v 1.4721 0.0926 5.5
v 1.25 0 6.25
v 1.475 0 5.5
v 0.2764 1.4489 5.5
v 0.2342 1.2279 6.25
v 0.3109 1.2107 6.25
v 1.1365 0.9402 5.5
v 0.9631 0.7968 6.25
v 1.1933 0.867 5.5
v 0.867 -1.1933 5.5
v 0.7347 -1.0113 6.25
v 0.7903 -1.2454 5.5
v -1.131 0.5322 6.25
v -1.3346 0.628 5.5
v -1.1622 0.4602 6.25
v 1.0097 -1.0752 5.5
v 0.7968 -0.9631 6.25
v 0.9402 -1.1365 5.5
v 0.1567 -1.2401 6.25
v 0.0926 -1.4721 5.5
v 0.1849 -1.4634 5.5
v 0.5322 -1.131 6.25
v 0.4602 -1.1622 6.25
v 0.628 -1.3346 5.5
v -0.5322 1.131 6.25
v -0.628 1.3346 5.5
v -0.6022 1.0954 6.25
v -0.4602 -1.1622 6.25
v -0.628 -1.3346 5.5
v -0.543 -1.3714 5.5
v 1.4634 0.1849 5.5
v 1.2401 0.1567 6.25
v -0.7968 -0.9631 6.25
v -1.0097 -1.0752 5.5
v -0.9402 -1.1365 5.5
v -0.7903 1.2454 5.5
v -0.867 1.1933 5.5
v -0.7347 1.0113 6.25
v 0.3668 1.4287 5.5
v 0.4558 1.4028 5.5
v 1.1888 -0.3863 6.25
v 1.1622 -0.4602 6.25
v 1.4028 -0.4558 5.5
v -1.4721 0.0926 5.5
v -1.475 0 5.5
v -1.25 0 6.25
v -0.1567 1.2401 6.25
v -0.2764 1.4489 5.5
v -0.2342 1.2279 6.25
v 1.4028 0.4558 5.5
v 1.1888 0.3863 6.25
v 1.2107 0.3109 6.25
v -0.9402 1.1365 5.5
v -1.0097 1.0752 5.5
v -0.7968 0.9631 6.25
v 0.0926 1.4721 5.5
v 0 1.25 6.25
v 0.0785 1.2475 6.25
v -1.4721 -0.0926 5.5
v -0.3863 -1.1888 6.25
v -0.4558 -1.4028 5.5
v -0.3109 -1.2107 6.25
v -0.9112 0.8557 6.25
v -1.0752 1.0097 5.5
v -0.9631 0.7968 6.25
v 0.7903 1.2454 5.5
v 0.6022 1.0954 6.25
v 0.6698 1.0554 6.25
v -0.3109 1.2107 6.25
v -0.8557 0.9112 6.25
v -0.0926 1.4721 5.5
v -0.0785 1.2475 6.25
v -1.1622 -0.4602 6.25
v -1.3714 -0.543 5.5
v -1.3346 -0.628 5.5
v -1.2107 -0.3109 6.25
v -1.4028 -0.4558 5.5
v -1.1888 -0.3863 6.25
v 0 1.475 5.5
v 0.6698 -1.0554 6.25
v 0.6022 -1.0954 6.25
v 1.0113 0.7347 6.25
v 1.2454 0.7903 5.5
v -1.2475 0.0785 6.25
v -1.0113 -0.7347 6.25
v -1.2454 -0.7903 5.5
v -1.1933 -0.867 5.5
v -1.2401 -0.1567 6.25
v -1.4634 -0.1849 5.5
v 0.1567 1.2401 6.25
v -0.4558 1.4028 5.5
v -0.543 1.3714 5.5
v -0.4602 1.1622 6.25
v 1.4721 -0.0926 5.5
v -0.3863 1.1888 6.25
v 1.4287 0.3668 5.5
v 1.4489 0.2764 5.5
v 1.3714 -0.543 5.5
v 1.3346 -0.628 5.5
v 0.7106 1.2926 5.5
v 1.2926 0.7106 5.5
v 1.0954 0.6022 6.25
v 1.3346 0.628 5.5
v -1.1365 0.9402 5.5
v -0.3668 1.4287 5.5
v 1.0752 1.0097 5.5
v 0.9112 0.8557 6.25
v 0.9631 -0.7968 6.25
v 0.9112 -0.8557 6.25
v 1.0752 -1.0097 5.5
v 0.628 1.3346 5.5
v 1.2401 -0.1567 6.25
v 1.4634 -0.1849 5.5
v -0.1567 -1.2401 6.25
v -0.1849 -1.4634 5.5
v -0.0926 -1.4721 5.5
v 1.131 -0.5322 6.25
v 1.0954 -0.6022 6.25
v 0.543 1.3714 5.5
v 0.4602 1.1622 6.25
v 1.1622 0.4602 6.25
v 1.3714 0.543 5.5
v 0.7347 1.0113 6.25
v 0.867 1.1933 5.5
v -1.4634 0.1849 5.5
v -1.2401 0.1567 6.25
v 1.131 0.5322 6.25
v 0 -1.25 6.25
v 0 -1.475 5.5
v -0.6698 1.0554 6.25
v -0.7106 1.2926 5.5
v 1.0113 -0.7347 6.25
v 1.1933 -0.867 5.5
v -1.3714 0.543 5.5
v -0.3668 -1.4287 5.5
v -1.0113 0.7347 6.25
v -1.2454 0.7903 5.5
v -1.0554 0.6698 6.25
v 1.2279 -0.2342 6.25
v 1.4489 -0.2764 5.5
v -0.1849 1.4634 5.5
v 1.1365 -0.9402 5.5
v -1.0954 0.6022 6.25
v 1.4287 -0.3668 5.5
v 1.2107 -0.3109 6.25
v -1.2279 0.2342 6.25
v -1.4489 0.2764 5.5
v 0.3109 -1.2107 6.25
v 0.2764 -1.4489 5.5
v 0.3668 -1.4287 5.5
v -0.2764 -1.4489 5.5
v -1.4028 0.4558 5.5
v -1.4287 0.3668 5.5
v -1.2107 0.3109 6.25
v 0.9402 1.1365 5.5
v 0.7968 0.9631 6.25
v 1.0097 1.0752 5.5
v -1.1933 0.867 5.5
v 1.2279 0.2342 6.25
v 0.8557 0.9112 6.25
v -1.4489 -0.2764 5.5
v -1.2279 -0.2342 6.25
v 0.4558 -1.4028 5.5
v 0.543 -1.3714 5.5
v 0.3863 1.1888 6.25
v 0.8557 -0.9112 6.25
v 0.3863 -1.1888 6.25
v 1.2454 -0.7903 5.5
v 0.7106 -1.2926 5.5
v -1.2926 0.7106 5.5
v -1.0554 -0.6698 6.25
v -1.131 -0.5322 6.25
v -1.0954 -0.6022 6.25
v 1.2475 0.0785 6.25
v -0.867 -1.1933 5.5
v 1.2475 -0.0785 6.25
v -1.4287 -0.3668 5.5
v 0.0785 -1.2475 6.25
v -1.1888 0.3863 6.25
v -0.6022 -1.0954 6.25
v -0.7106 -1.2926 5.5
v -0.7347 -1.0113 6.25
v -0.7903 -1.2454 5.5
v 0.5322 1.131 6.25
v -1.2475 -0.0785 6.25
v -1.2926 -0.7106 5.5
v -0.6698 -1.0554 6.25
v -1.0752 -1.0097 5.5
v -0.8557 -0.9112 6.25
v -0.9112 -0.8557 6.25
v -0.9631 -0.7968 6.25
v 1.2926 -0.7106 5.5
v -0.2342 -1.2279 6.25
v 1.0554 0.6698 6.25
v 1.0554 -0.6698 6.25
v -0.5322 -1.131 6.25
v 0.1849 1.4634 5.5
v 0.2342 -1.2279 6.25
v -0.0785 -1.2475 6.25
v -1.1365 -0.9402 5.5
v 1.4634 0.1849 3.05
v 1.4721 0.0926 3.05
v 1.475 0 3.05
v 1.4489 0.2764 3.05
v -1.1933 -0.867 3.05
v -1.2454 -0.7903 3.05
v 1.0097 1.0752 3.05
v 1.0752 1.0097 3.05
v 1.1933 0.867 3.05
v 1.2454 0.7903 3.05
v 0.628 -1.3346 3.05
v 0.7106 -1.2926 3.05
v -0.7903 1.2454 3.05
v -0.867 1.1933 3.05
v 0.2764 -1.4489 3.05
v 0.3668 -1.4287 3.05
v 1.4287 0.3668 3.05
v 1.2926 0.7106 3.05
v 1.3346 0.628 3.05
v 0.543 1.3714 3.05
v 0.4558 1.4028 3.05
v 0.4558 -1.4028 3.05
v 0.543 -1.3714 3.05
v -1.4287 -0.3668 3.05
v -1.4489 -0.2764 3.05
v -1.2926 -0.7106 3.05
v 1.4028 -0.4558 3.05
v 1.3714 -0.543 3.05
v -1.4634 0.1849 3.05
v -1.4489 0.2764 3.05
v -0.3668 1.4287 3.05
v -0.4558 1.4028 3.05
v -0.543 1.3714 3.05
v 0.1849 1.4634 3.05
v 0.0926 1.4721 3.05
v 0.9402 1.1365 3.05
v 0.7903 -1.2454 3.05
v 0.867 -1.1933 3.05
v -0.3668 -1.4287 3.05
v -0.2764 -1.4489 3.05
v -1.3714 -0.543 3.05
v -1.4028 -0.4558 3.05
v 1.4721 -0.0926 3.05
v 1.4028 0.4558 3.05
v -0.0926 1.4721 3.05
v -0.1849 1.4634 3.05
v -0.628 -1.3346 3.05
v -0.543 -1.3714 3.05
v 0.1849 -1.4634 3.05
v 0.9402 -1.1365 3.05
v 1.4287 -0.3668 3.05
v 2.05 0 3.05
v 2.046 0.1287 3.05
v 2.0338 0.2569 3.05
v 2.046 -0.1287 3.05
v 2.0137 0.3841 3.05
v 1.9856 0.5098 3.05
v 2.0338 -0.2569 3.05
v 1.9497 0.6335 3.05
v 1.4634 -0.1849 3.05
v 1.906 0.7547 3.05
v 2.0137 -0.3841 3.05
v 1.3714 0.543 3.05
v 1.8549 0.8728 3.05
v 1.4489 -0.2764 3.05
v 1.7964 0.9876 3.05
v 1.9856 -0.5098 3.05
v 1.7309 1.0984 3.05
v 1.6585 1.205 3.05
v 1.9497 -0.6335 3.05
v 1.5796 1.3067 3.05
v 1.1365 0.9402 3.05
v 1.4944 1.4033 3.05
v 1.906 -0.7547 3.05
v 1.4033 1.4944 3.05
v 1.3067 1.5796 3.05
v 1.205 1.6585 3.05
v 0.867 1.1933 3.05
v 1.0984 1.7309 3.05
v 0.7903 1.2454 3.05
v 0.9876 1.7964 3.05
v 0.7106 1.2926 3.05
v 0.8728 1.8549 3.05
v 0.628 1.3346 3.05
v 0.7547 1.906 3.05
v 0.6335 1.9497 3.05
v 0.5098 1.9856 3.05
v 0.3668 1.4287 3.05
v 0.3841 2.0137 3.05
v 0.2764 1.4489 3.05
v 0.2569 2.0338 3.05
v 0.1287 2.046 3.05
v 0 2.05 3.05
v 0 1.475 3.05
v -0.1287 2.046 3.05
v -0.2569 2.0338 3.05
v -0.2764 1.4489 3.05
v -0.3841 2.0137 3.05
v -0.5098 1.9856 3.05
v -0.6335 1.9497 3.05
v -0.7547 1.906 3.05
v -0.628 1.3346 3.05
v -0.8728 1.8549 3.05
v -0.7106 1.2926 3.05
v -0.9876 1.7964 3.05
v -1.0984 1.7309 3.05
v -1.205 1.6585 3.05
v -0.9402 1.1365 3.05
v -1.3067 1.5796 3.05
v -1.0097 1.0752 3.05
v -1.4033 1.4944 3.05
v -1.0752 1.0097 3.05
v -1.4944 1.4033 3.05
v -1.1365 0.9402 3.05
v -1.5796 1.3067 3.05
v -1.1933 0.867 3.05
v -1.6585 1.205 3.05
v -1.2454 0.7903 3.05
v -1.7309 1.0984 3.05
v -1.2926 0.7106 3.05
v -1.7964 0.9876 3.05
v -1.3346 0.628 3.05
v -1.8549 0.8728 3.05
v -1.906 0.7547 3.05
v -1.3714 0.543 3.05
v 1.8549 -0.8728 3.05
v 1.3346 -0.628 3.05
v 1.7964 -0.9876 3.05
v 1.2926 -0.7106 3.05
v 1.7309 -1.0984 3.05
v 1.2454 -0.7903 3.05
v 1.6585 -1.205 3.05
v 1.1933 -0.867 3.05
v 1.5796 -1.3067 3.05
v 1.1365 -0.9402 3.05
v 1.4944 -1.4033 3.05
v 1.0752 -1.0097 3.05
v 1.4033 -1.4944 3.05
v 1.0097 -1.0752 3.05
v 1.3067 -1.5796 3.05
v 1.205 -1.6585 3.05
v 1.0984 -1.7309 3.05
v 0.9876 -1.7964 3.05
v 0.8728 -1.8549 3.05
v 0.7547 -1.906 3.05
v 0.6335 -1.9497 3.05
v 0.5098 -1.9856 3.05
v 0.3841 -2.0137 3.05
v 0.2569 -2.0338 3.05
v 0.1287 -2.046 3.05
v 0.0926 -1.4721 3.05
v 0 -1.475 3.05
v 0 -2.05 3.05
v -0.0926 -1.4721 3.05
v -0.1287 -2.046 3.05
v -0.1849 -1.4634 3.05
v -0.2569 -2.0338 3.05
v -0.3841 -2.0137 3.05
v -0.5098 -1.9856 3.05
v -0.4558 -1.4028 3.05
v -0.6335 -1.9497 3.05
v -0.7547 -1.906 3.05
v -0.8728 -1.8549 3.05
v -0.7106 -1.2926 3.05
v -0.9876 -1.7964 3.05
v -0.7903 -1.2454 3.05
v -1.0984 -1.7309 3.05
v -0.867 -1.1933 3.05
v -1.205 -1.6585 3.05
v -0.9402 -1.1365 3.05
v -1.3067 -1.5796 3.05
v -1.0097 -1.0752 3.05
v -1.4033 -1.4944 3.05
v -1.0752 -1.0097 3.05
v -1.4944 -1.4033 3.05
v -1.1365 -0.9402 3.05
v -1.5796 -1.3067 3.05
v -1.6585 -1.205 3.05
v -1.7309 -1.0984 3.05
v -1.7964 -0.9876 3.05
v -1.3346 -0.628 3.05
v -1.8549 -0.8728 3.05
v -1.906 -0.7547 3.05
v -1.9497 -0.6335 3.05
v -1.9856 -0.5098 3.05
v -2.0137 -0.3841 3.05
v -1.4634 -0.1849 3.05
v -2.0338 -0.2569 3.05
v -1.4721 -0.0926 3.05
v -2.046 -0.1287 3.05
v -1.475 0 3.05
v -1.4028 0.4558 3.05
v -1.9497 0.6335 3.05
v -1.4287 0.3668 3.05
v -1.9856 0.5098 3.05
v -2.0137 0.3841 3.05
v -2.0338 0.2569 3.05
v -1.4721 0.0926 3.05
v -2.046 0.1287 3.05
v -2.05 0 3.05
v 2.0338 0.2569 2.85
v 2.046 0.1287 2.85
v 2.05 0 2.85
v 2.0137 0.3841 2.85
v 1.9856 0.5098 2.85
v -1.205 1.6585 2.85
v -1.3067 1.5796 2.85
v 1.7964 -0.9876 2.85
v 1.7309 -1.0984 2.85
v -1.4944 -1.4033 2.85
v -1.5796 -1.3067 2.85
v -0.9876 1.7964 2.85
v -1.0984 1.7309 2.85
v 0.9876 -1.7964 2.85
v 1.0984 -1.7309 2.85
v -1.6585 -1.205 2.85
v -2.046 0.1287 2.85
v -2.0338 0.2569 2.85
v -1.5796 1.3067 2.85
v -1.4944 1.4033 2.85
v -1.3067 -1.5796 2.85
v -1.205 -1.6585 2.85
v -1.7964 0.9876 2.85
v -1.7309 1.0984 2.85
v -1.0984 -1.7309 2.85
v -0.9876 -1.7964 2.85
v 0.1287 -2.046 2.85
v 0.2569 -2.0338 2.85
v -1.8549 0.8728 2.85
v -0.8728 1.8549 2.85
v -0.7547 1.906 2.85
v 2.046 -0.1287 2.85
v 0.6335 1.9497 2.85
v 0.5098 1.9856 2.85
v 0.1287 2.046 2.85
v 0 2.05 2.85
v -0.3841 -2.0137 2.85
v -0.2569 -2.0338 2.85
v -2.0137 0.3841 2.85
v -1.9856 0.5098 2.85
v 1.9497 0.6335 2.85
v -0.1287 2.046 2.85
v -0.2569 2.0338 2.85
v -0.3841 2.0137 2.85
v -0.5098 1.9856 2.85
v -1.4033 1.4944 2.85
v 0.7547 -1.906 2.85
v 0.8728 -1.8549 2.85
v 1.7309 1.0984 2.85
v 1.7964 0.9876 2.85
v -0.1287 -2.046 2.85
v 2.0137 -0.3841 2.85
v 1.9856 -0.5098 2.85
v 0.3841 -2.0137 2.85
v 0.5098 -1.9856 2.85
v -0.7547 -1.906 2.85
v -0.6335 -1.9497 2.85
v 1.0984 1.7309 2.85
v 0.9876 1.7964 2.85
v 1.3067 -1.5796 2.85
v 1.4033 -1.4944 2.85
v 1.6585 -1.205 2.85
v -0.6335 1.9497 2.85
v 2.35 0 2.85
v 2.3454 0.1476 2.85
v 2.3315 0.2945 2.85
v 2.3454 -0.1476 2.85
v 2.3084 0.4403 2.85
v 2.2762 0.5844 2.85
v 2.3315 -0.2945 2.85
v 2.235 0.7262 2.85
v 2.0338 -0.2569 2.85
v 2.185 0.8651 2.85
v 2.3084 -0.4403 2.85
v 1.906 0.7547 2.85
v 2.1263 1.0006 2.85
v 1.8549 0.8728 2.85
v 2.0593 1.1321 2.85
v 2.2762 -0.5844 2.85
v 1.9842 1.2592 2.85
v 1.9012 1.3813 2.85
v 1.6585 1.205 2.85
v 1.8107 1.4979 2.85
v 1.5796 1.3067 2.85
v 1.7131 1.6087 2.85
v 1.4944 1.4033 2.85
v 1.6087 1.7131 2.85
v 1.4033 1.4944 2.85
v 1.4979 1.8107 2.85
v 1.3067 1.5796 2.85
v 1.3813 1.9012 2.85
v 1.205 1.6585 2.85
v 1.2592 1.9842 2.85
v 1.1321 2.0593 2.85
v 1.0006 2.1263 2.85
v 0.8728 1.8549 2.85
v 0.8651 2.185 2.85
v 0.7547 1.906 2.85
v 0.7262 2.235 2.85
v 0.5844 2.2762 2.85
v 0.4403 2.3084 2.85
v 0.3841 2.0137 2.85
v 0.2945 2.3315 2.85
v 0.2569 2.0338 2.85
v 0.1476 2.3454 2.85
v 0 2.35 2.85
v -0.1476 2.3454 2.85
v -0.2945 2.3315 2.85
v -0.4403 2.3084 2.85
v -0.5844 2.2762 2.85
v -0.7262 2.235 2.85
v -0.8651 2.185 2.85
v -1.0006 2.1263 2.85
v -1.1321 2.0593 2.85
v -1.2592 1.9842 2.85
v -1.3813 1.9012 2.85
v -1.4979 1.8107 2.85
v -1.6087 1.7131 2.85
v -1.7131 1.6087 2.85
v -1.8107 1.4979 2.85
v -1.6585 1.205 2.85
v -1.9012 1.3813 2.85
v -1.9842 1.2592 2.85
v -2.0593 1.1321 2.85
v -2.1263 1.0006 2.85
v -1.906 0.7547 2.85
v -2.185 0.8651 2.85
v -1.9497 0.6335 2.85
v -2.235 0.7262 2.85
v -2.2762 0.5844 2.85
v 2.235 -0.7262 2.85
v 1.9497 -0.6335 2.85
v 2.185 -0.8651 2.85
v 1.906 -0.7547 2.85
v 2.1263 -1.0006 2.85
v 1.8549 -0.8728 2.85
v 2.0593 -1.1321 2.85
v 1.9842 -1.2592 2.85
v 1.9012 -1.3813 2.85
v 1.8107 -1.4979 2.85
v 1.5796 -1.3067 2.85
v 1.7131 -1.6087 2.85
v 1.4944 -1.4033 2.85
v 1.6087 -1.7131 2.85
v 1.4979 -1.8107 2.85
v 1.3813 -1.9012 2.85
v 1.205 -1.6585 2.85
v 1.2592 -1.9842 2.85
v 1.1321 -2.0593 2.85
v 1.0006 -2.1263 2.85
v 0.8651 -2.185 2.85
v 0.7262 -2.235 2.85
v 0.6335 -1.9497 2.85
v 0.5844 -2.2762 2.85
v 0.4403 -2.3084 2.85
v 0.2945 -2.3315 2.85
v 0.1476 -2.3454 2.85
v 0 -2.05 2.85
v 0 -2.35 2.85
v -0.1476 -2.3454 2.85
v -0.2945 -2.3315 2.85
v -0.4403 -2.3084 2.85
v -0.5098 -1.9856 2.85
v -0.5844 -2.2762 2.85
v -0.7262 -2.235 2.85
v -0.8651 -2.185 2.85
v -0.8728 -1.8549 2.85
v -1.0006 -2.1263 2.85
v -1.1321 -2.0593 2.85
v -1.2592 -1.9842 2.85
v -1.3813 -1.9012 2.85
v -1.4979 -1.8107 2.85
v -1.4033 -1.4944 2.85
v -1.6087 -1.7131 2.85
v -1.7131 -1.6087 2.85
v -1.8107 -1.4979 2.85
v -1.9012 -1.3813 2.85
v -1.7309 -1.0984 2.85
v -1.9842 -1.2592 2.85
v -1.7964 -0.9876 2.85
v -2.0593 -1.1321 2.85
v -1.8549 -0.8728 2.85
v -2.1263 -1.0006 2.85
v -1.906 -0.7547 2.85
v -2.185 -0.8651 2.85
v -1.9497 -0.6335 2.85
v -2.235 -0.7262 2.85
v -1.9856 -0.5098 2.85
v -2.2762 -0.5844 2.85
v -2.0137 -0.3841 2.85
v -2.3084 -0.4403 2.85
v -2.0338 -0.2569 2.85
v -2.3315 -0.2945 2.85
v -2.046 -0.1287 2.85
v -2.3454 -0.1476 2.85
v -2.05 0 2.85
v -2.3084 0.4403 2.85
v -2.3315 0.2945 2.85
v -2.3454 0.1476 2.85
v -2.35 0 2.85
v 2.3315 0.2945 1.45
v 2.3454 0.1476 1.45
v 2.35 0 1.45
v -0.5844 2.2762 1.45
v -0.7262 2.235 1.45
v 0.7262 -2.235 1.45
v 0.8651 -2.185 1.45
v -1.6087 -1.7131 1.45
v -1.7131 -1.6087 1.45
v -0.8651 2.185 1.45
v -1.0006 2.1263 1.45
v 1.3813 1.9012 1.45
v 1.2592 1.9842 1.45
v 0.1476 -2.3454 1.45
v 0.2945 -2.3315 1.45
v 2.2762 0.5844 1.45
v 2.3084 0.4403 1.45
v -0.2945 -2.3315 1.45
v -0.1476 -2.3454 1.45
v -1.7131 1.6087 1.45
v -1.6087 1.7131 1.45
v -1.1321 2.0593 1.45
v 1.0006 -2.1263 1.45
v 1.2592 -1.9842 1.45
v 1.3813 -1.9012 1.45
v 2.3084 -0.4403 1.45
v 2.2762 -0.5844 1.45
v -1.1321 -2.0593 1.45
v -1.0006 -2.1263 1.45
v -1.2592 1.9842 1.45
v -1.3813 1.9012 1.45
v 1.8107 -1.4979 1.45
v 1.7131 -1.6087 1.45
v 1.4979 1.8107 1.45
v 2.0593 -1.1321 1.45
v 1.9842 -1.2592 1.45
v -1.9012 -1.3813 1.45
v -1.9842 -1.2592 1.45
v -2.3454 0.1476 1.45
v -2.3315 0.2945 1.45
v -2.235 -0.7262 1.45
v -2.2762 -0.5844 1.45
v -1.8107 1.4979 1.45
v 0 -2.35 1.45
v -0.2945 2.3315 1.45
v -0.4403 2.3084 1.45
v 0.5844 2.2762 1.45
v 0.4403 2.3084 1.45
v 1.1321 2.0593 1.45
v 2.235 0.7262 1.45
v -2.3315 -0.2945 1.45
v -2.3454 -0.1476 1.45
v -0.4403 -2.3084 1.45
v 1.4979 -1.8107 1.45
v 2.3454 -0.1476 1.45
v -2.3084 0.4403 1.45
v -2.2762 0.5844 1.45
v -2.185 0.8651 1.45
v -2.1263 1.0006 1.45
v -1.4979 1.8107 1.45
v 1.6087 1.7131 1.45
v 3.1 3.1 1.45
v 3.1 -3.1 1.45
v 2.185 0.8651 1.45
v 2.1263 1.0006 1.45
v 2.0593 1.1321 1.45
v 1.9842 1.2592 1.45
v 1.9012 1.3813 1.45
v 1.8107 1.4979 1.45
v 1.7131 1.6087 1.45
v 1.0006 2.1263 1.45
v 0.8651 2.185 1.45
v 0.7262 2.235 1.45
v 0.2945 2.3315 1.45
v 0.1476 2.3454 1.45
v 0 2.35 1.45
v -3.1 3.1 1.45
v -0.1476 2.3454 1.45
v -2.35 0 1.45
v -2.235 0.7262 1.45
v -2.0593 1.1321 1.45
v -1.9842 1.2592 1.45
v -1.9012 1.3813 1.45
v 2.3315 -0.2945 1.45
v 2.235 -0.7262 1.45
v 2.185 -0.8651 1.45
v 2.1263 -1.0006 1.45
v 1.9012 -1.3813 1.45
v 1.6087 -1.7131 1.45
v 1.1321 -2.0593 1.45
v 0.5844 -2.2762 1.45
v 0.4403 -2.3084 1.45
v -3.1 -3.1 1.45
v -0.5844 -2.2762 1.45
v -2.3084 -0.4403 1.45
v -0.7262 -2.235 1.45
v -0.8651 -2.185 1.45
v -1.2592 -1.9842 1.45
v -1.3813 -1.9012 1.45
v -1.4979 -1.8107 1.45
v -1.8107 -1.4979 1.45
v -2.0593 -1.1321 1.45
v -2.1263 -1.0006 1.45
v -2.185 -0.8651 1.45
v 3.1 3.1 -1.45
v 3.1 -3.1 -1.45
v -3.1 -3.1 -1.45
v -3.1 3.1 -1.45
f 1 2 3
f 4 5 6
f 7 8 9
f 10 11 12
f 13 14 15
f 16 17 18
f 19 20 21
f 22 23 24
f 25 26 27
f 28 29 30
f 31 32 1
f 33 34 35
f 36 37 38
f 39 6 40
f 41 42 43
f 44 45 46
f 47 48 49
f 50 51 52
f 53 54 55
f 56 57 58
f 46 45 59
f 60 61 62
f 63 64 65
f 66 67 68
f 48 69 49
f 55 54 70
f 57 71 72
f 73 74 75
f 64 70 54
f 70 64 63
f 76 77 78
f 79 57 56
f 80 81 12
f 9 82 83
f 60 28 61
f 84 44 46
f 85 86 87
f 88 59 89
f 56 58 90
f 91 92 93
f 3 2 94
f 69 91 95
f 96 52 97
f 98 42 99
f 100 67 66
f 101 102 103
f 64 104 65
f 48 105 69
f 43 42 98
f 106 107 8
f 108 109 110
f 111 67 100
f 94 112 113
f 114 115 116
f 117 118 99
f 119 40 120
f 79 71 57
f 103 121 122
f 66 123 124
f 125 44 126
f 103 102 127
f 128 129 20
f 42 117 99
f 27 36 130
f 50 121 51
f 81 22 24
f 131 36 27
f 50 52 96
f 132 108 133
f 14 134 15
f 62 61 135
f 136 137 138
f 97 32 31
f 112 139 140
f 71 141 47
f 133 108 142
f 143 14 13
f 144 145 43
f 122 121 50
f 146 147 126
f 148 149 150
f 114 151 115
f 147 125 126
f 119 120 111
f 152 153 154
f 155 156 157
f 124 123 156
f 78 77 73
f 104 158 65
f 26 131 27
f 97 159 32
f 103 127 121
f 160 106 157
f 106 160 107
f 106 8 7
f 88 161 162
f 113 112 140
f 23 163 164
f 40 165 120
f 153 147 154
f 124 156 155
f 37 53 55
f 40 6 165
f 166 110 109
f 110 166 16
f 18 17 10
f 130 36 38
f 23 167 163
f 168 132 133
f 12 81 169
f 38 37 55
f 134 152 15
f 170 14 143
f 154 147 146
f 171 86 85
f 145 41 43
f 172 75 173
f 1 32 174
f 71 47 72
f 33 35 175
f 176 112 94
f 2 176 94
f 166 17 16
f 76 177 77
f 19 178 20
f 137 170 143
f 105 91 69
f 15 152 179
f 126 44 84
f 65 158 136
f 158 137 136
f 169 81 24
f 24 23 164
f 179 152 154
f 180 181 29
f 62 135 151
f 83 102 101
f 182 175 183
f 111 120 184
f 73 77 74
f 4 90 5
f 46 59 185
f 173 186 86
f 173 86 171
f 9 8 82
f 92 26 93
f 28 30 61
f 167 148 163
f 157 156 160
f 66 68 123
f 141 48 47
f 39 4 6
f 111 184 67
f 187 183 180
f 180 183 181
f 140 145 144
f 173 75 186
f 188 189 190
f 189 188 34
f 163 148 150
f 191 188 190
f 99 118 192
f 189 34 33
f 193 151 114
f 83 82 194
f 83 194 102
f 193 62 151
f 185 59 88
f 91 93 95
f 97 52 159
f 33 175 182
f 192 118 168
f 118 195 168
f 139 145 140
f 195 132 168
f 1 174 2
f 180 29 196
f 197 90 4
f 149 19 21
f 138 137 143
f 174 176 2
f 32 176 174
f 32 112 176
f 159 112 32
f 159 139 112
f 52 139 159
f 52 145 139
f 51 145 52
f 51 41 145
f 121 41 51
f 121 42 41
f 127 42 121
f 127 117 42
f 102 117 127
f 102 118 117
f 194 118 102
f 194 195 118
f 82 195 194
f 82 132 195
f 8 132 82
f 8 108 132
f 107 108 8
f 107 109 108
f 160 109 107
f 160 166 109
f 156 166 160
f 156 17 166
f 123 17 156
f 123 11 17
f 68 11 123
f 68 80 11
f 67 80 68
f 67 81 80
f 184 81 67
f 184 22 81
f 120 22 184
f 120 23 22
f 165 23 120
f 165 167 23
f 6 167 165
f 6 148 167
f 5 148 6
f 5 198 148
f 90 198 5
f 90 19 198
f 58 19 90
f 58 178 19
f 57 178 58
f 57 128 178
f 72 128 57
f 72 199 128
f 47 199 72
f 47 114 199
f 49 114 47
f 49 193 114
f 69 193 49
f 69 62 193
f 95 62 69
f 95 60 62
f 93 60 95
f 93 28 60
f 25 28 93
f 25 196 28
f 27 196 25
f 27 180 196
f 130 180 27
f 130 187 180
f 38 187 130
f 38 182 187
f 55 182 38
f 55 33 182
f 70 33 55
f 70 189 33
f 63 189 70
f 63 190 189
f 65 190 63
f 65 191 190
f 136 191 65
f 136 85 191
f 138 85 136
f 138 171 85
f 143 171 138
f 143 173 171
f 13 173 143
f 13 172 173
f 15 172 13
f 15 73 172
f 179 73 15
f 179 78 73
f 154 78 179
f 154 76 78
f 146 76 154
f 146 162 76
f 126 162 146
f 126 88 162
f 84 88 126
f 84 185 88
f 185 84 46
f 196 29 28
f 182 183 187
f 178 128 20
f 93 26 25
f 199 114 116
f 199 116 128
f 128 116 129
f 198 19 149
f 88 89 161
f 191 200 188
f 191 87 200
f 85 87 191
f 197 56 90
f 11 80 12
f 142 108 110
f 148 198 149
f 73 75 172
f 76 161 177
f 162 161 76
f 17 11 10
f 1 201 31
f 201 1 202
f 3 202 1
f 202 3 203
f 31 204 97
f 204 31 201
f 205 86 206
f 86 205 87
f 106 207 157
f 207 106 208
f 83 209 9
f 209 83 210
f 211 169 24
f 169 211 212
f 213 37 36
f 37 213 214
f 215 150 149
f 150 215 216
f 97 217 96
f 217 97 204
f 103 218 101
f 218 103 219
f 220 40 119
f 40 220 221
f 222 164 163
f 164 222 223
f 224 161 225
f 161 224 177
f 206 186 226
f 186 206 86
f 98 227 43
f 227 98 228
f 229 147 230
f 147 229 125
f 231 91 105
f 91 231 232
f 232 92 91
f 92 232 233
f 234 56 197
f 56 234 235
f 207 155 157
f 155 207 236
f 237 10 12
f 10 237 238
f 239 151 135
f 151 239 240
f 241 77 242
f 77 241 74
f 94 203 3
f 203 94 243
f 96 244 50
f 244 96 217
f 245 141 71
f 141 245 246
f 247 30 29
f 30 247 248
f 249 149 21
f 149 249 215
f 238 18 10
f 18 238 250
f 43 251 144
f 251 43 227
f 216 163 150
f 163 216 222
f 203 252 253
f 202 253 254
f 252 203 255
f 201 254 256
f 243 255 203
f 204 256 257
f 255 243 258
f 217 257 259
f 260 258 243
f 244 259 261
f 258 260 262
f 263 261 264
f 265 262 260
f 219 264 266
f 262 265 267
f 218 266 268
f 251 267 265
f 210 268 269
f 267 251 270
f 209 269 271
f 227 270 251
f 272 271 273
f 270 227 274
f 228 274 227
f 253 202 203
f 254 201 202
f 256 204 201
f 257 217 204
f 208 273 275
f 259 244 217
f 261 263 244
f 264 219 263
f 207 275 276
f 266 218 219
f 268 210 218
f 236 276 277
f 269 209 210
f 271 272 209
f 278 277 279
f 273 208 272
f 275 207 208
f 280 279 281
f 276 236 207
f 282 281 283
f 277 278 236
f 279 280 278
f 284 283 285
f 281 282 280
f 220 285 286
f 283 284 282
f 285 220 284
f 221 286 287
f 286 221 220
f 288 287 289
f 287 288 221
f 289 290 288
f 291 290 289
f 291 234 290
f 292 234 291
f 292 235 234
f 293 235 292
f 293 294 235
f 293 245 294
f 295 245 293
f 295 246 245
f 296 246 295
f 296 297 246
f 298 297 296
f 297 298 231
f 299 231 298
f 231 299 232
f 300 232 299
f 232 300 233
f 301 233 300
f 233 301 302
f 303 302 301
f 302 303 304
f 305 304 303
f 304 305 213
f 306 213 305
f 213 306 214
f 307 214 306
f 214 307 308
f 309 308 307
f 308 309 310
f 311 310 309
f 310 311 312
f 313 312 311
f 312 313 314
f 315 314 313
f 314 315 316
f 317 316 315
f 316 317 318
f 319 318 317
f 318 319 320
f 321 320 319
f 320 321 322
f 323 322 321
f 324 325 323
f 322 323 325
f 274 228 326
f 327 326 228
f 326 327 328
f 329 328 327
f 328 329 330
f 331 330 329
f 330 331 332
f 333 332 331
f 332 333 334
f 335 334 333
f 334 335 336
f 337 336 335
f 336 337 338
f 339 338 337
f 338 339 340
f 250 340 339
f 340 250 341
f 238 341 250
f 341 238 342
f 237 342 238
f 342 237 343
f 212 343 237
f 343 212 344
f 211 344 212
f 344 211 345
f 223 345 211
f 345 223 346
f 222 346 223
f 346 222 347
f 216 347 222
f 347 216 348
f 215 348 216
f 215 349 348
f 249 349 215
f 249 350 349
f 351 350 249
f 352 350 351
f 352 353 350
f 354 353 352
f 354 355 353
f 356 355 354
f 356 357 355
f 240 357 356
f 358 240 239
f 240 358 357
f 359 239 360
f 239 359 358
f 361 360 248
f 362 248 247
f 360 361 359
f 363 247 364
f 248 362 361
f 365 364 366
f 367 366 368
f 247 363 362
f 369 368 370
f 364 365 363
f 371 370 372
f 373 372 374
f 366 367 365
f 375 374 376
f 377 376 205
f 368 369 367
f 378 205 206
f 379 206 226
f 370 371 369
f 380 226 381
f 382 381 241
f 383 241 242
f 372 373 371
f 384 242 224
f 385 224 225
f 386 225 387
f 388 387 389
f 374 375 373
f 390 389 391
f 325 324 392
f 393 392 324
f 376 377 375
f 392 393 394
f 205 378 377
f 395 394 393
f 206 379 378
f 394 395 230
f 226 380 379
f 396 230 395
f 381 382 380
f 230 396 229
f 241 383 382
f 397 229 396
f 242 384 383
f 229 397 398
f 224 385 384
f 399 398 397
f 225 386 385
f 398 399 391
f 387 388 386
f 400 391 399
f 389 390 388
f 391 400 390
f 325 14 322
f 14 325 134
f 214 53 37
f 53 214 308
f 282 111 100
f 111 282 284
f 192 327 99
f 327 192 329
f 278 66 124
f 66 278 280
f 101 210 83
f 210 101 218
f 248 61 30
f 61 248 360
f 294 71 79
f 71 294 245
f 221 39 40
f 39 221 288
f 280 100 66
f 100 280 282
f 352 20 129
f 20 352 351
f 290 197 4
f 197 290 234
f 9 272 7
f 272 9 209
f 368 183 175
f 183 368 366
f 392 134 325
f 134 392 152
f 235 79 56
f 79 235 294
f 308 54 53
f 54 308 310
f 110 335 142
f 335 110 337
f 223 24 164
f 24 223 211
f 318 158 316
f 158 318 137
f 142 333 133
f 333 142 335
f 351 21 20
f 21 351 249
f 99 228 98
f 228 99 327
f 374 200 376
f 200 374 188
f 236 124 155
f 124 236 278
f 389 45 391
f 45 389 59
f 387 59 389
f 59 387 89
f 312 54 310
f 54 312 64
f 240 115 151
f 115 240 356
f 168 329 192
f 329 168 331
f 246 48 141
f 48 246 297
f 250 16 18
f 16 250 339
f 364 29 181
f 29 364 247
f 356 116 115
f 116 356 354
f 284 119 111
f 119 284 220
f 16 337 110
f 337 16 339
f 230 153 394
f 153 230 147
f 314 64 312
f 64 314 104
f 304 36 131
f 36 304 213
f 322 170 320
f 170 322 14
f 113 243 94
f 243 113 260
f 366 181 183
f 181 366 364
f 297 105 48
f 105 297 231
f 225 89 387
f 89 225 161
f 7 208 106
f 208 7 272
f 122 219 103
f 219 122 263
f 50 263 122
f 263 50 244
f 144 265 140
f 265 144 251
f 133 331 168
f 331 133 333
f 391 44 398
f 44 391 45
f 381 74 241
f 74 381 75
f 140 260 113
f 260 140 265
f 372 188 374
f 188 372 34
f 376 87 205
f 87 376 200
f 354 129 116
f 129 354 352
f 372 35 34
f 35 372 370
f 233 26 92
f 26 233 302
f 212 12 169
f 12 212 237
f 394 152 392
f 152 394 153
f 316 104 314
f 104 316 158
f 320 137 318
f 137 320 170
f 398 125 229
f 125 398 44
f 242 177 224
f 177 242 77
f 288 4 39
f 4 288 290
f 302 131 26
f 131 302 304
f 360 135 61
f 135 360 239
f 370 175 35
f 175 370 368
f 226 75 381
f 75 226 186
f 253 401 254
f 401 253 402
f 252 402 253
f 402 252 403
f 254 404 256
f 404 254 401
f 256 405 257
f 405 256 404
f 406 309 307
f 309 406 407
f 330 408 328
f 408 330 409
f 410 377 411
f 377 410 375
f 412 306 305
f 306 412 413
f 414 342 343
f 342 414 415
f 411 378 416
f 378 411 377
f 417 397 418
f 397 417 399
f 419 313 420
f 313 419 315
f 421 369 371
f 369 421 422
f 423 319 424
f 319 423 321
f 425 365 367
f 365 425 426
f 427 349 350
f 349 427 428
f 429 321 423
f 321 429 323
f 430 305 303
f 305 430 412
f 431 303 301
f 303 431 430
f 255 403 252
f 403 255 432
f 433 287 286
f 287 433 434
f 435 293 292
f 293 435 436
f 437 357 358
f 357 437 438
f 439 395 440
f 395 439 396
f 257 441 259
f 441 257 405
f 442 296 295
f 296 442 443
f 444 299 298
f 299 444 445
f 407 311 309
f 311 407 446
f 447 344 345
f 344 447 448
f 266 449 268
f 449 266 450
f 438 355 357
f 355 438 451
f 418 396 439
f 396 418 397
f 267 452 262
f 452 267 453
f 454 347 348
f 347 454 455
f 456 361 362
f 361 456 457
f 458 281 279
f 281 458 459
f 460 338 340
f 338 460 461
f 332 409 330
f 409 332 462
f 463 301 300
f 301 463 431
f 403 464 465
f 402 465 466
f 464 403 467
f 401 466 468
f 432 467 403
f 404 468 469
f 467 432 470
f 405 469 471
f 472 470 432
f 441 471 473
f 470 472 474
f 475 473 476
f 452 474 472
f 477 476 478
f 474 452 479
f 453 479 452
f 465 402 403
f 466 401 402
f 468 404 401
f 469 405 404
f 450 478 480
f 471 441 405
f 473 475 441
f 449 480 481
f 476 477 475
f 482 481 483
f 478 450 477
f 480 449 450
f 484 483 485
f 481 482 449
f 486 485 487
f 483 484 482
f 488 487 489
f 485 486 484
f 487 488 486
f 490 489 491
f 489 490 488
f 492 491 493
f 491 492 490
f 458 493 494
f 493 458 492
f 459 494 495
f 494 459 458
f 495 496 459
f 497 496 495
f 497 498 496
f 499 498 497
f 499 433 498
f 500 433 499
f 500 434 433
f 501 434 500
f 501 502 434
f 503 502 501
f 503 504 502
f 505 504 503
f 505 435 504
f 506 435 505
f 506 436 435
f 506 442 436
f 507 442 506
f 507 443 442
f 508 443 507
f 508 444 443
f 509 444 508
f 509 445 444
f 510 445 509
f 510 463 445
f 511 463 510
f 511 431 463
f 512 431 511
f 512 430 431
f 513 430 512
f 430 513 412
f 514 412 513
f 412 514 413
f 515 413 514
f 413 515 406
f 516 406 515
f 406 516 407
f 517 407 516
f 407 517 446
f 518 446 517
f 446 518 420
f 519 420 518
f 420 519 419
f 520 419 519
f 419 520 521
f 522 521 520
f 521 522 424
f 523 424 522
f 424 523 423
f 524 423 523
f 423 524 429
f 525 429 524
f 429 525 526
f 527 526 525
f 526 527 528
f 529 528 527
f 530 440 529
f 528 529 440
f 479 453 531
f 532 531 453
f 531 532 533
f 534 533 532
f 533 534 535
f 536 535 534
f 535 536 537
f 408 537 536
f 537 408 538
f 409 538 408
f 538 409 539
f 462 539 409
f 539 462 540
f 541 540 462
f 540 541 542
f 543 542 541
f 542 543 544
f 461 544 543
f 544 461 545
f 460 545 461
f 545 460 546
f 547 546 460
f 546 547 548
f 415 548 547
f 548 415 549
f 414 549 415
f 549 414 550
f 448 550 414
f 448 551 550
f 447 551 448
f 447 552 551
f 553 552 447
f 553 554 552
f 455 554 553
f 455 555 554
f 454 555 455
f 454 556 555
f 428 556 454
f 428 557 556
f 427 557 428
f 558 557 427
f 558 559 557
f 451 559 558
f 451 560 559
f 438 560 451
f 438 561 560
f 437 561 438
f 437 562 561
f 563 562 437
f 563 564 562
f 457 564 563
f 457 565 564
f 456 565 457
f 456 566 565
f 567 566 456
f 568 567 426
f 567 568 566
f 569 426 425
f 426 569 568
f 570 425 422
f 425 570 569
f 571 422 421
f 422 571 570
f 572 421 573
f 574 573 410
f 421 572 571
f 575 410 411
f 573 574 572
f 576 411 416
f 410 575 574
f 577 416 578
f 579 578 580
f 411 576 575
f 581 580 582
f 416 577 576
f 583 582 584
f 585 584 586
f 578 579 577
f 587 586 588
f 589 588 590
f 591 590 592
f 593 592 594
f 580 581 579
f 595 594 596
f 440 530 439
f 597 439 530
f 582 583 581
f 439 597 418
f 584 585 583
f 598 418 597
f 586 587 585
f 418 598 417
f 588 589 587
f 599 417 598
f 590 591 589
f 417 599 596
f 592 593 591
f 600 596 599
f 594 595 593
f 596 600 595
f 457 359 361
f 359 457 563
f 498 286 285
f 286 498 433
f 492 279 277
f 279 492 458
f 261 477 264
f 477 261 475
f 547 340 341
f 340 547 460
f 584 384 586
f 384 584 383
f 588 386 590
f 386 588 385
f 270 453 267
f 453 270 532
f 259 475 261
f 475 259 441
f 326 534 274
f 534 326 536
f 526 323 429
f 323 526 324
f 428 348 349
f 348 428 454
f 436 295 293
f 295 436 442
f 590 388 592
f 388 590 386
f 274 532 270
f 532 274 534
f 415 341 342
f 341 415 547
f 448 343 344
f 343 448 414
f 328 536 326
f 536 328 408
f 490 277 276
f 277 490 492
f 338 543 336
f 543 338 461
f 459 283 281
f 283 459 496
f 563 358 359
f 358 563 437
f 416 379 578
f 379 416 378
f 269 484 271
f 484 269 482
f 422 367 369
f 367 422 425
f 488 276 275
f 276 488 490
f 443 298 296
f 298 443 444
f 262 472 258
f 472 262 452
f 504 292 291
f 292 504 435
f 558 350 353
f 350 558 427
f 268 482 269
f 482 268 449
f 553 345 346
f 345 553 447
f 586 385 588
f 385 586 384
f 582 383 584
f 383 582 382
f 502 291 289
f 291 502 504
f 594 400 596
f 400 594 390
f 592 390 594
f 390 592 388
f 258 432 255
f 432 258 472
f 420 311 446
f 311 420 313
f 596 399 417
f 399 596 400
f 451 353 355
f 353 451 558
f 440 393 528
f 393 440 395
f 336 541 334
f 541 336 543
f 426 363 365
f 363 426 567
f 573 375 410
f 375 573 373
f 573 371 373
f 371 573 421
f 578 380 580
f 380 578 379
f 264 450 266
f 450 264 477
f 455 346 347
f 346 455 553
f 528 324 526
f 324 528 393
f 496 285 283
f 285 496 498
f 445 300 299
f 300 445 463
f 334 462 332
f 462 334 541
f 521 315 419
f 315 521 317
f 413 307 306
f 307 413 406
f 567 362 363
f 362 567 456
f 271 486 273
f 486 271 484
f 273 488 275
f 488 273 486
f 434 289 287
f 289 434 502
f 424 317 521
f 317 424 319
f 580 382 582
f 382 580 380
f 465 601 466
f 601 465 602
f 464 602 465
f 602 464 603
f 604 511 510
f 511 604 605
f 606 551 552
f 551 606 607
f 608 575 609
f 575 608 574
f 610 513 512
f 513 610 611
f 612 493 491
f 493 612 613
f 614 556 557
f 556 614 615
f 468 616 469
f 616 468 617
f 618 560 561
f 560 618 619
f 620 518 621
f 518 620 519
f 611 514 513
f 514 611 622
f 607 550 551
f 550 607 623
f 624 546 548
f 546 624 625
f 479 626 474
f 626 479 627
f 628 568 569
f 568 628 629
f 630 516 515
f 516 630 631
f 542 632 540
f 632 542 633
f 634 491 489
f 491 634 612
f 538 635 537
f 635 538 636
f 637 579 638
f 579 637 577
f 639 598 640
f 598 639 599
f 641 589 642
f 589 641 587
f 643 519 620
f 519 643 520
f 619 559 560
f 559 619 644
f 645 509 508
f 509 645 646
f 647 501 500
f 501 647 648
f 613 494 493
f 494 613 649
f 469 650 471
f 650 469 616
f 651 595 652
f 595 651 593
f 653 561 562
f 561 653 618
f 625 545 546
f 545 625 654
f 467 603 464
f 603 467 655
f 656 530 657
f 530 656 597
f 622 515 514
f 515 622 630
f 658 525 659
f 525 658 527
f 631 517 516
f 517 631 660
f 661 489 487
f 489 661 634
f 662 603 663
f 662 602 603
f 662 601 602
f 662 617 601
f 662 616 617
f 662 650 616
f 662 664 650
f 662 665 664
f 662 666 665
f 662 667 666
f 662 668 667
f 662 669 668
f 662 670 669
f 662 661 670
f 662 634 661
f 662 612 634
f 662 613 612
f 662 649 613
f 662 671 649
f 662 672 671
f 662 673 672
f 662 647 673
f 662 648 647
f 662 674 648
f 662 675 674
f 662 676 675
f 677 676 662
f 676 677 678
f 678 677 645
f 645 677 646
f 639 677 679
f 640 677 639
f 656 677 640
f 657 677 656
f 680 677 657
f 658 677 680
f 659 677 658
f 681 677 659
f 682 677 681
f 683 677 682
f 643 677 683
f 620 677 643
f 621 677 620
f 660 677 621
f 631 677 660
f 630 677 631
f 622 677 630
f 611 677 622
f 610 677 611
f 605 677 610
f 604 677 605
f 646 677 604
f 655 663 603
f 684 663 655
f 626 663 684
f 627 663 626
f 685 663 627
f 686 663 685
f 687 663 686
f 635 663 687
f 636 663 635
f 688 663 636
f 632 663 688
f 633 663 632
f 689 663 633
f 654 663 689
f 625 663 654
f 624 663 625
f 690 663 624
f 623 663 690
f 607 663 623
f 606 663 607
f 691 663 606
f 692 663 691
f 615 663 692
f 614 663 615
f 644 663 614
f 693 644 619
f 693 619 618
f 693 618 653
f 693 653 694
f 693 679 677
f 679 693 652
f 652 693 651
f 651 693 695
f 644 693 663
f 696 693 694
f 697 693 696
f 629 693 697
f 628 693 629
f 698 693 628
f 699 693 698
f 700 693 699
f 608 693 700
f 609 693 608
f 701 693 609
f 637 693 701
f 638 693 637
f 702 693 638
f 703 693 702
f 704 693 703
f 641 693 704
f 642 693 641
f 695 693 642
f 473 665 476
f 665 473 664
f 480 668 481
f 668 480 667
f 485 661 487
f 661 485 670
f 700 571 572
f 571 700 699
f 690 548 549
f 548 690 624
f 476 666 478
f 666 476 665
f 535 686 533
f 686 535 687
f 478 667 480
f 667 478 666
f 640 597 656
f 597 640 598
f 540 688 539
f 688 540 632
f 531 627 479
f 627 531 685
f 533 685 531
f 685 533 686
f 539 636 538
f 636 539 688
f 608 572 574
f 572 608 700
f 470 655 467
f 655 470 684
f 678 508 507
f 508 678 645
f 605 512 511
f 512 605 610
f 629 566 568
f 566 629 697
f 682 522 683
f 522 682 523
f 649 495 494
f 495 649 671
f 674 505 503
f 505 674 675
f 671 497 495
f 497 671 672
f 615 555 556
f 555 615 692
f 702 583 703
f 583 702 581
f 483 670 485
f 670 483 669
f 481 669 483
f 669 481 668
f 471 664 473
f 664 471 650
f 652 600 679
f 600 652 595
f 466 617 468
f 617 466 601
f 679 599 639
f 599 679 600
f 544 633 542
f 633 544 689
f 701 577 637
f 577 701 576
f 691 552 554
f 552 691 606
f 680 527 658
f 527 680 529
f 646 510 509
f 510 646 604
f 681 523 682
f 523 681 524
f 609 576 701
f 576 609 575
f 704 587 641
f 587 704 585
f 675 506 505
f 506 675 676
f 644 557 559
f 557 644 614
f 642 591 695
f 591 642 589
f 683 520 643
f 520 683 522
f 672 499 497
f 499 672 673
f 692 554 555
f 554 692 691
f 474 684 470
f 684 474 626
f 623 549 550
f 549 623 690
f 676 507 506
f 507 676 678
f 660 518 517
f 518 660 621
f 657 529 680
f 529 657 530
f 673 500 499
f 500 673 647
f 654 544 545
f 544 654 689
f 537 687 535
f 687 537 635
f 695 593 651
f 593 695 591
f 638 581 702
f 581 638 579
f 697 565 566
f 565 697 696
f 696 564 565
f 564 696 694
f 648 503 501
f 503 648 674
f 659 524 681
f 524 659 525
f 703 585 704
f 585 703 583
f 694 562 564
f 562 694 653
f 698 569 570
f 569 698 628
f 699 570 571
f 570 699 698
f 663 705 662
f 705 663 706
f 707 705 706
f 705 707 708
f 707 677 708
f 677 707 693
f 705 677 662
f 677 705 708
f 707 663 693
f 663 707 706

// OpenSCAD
//Resolution
$fn=100;

translate([0,0,5.5]) cylinder(h=0.75,r2=2.5/2, r1=2.95/2);
translate([0,0,3.05]) cylinder(h=2.45,r=2.95/2);
translate([0,0,2.85]) cylinder(h=0.2,r=4.1/2);
translate([0,0,1.45]) cylinder(h=1.4,r=4.7/2);
translate([0,0,0]) cube(size=[6.2,6.2,2.9], center=true);
